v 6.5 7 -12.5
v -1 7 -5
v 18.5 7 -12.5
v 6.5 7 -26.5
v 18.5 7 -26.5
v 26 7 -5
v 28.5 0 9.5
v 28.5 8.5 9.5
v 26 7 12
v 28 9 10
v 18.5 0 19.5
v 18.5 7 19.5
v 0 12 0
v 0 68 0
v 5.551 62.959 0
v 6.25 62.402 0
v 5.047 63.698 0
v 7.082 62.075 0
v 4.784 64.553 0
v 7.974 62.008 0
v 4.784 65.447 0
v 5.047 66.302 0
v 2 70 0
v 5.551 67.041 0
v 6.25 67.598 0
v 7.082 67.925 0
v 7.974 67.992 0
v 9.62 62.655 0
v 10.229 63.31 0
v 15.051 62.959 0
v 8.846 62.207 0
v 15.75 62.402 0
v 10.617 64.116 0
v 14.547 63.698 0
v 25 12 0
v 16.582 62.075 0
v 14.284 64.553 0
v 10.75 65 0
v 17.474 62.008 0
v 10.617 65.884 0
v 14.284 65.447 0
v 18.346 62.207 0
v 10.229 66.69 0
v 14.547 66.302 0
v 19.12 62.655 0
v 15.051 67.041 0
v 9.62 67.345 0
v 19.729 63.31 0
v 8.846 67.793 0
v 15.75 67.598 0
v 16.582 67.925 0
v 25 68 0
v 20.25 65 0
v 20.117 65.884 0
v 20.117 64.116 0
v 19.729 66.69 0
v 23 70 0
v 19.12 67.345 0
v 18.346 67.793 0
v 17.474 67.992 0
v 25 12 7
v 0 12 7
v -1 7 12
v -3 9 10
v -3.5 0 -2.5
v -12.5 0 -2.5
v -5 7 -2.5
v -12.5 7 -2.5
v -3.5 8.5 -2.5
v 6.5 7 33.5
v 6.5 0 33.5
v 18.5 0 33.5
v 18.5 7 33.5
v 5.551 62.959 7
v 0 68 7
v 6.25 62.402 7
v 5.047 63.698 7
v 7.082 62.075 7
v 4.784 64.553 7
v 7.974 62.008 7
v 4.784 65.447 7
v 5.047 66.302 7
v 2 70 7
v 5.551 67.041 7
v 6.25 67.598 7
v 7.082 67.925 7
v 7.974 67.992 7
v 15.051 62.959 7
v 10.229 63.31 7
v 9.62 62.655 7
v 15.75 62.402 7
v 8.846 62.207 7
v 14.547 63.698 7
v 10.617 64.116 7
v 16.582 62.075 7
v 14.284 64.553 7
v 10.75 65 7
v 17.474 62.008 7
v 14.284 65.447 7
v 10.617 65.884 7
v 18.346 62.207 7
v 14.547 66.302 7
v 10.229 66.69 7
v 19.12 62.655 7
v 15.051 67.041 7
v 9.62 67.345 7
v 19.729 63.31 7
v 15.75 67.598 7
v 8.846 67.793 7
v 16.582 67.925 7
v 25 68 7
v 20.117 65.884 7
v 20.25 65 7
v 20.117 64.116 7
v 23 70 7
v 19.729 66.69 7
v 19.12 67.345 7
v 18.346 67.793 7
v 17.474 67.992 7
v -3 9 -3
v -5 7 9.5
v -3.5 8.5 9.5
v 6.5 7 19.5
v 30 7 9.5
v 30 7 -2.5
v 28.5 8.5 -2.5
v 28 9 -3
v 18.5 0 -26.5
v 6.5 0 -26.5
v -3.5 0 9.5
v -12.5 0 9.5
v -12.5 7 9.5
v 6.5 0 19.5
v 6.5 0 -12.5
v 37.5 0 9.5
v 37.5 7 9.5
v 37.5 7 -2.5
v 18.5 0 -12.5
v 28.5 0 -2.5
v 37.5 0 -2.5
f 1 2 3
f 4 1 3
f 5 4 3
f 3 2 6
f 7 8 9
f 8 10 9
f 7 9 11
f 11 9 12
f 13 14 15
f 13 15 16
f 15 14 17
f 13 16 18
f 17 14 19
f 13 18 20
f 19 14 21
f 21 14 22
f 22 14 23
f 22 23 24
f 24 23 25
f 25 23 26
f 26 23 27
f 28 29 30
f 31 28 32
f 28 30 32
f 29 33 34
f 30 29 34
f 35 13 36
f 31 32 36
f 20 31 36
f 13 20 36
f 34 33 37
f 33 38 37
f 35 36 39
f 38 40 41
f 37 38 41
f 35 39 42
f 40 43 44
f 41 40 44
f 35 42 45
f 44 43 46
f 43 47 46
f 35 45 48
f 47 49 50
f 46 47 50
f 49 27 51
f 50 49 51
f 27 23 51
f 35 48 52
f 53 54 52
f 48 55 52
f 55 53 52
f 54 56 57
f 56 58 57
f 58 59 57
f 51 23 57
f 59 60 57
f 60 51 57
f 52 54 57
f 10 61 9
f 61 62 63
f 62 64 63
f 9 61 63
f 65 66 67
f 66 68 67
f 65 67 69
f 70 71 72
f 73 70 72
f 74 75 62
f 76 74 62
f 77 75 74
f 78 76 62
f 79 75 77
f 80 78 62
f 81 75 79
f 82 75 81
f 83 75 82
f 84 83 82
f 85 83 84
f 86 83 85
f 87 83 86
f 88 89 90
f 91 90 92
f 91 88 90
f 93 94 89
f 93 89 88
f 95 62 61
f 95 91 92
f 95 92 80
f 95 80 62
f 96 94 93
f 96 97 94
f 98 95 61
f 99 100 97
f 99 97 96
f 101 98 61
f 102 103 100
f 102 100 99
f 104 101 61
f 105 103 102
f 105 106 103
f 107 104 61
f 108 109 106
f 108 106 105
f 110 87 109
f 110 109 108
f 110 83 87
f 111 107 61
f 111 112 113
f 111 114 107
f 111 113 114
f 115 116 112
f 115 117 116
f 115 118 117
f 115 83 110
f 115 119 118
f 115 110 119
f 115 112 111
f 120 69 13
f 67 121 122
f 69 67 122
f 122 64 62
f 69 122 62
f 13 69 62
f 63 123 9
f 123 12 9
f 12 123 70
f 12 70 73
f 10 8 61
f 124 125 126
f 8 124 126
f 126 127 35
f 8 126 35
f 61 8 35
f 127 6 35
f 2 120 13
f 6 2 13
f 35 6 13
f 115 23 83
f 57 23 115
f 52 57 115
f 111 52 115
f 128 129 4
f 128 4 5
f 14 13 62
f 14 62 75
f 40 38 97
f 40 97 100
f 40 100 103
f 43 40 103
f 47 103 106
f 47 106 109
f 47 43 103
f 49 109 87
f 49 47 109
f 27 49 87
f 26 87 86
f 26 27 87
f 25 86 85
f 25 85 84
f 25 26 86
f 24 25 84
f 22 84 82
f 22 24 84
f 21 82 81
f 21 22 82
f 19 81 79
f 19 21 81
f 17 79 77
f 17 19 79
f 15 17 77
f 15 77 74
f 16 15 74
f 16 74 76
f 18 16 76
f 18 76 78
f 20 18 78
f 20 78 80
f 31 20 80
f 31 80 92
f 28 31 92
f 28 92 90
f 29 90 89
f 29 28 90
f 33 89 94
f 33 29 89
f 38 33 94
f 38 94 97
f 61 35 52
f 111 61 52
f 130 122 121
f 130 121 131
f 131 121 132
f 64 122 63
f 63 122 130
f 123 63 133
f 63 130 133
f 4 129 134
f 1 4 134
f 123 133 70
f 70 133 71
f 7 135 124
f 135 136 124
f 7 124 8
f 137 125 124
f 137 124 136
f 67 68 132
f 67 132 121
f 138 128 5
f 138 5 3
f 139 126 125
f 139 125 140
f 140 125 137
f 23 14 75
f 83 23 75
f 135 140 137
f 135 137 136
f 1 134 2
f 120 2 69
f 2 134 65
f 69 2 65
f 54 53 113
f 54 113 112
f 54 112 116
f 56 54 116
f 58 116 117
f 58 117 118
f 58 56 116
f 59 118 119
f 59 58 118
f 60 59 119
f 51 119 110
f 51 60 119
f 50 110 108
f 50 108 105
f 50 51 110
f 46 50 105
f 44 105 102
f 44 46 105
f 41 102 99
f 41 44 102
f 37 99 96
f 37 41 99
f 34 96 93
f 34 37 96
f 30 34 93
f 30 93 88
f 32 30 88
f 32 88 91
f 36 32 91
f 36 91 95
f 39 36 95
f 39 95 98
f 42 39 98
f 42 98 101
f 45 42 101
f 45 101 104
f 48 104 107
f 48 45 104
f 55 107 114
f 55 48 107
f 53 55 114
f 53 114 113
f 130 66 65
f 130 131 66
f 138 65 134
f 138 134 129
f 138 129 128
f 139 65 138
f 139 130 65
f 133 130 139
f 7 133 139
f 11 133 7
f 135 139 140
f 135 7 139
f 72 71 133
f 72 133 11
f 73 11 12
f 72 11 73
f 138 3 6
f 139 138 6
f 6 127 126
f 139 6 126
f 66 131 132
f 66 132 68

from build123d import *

# Parameters (mm, degrees)
SKETCH1_W           = 25
SKETCH1_H           = 70
SKETCH1_R           = 3
BOSS_EXTRUDE1_DEPTH = 7
SKETCH2_W           = 12
SKETCH2_H           = 24
SKETCH2_H_2         = 7
SKETCH2_W_2         = 6.5
SKETCH2_H_3         = 2.5
BOSS_EXTRUDE2_DEPTH = 7
CHAMFER2_SIZE       = 10
CHAMFER3_SIZE       = 5
CHAMFER4_SIZE       = 5
CHAMFER5_SIZE       = 2


with BuildPart() as part:
    # Sketch1 → Boss-Extrude1 (new body)
    with BuildSketch(Plane.XY):
        with Locations((12.5, 35)):
            Rectangle(SKETCH1_W, SKETCH1_H)
        with Locations((7.75, 65)):
            Circle(SKETCH1_R, mode=Mode.SUBTRACT)
        with Locations((17.25, 65)):
            Circle(SKETCH1_R, mode=Mode.SUBTRACT)
    extrude(amount=BOSS_EXTRUDE1_DEPTH)

    # Sketch2 → Boss-Extrude2 (add)
    with BuildSketch(Plane.XZ):
        with Locations((12.5, 21.5)):
            Rectangle(SKETCH2_W, SKETCH2_H)
        Polygon((6.5, 7), (6.5, 9.5), (-12.5, 9.5), (-12.5, -2.5), (6.5, -2.5), (6.5, 0), (0, 0), (0, 7), align=None)
        with Locations((12.5, 3.5)):
            Rectangle(SKETCH2_W, SKETCH2_H_2)
        Polygon((37.5, 9.5), (18.5, 9.5), (18.5, 7), (25, 7), (25, 0), (18.5, 0), (18.5, -2.5), (37.5, -2.5), align=None)
        with Locations((12.5, -14.5)):
            Rectangle(SKETCH2_W, SKETCH2_H)
        with Locations((3.25, 3.5)):
            Rectangle(SKETCH2_W_2, SKETCH2_H_2)
        with Locations((12.5, 8.25)):
            Rectangle(SKETCH2_W, SKETCH2_H_3)
        with Locations((12.5, -1.25)):
            Rectangle(SKETCH2_W, SKETCH2_H_3)
        with Locations((21.75, 3.5)):
            Rectangle(SKETCH2_W_2, SKETCH2_H_2)
    extrude(amount=-BOSS_EXTRUDE2_DEPTH)

    # Chamfer2
    chamfer2_edges = [part.edges().sort_by_distance(p)[0] for p in [
        (18.5, 3.5, 9.5),
        (18.5, 3.5, -2.5),
        (6.5, 3.5, -2.5),
        (6.5, 3.5, 9.5),
    ]]
    chamfer(chamfer2_edges, length=CHAMFER2_SIZE)

    # Chamfer3
    chamfer3_edges = [part.edges().sort_by_distance(p)[0] for p in [
        (12.5, 7, 7),
        (12.5, 7, 0),
    ]]
    chamfer(chamfer3_edges, length=CHAMFER3_SIZE)

    # Chamfer4
    # the kernel refuses this chamfer: 5 mm, written as the material it adds along each edge
    with BuildSketch(Plane(origin=(25, 7, -17.85841494), x_dir=(0.9996219169112968, -0.027495876610586317, 0), z_dir=(0, 0, 1))) as chamfer4_piece_1_section:
        Polygon((CHAMFER4_SIZE * 0.999621916911, CHAMFER4_SIZE * 0.0274958766106), (-CHAMFER4_SIZE * 0.0274958766106, CHAMFER4_SIZE * 0.999621916911), (0, 0), align=None)
    chamfer4_piece_1 = extrude(amount=42.71682988, mode=Mode.PRIVATE)
    chamfer4_piece_1 = split(chamfer4_piece_1, bisect_by=Plane(origin=(26.380997475, 7.88604798, 9.5), z_dir=(0, 0, -1)), keep=Keep.TOP, mode=Mode.PRIVATE)
    chamfer4_piece_1 = split(chamfer4_piece_1, bisect_by=Plane(origin=(27.086016414, 7.88604798, -3.913983586), z_dir=(-0.7071067811865475, 0, 0.7071067811865477)), keep=Keep.TOP, mode=Mode.PRIVATE)
    chamfer4_piece_1 = split(chamfer4_piece_1, bisect_by=Plane(origin=(26.380997475, 8.338541667, -3.661458333), z_dir=(0, -0.7071067811865476, 0.7071067811865476)), keep=Keep.TOP, mode=Mode.PRIVATE)
    chamfer4_piece_1 = split(chamfer4_piece_1, bisect_by=Plane(origin=(26.380997475, 15.047506313, 3.952493687), z_dir=(0, -0.7071067811865476, -0.7071067811865476)), keep=Keep.TOP, mode=Mode.PRIVATE)
    add(chamfer4_piece_1)
    with BuildSketch(Plane(origin=(25, 7, -17.85841494), x_dir=(0.9996219169112968, -0.027495876610586317, 0), z_dir=(0, 0, 1))) as chamfer4_piece_2_section:
        Polygon((CHAMFER4_SIZE * 0.999621916911, CHAMFER4_SIZE * 0.0274958766106), (-CHAMFER4_SIZE * 0.0274958766106, CHAMFER4_SIZE * 0.999621916911), (0, 0), align=None)
    chamfer4_piece_2 = extrude(amount=42.71682988, mode=Mode.PRIVATE)
    chamfer4_piece_2 = split(chamfer4_piece_2, bisect_by=Plane(origin=(34.6875, 7.375, 3.3125), z_dir=(-0.7071067811865475, 0, -0.7071067811865477)), keep=Keep.TOP, mode=Mode.PRIVATE)
    chamfer4_piece_2 = split(chamfer4_piece_2, bisect_by=Plane(origin=(29.25, 7.375, -2.5), z_dir=(0, 0, 1)), keep=Keep.TOP, mode=Mode.PRIVATE)
    chamfer4_piece_2 = split(chamfer4_piece_2, bisect_by=Plane(origin=(29.25, 8.625, -3.375), z_dir=(0, -0.7071067811865476, 0.7071067811865476)), keep=Keep.TOP, mode=Mode.PRIVATE)
    chamfer4_piece_2 = split(chamfer4_piece_2, bisect_by=Plane(origin=(29.25, 14.25, 4.75), z_dir=(0, -0.7071067811865476, -0.7071067811865476)), keep=Keep.TOP, mode=Mode.PRIVATE)
    add(chamfer4_piece_2)
    with BuildSketch(Plane(origin=(0, 7, 24.85841494), x_dir=(-0.9996219169112968, -0.027495876610586317, 0), z_dir=(0, 0, -1))) as chamfer4_piece_3_section:
        Polygon((CHAMFER4_SIZE * 0.999621916911, CHAMFER4_SIZE * 0.0274958766106), (-CHAMFER4_SIZE * 0.0274958766106, CHAMFER4_SIZE * 0.999621916911), (0, 0), align=None)
    chamfer4_piece_3 = extrude(amount=42.71682988, mode=Mode.PRIVATE)
    chamfer4_piece_3 = split(chamfer4_piece_3, bisect_by=Plane(origin=(-2.086016414, 7.88604798, 10.913983586), z_dir=(0.7071067811865477, 0, -0.7071067811865475)), keep=Keep.TOP, mode=Mode.PRIVATE)
    chamfer4_piece_3 = split(chamfer4_piece_3, bisect_by=Plane(origin=(-1.380997475, 7.88604798, -2.5), z_dir=(0, 0, 1)), keep=Keep.TOP, mode=Mode.PRIVATE)
    chamfer4_piece_3 = split(chamfer4_piece_3, bisect_by=Plane(origin=(-1.380997475, 15.047506313, 3.047506313), z_dir=(0, -0.7071067811865476, 0.7071067811865476)), keep=Keep.TOP, mode=Mode.PRIVATE)
    chamfer4_piece_3 = split(chamfer4_piece_3, bisect_by=Plane(origin=(-1.380997475, 8.338541667, 10.661458333), z_dir=(0, -0.7071067811865476, -0.7071067811865476)), keep=Keep.TOP, mode=Mode.PRIVATE)
    add(chamfer4_piece_3)
    with BuildSketch(Plane(origin=(0, 7, 24.85841494), x_dir=(-0.9996219169112968, -0.027495876610586317, 0), z_dir=(0, 0, -1))) as chamfer4_piece_4_section:
        Polygon((CHAMFER4_SIZE * 0.999621916911, CHAMFER4_SIZE * 0.0274958766106), (-CHAMFER4_SIZE * 0.0274958766106, CHAMFER4_SIZE * 0.999621916911), (0, 0), align=None)
    chamfer4_piece_4 = extrude(amount=42.71682988, mode=Mode.PRIVATE)
    chamfer4_piece_4 = split(chamfer4_piece_4, bisect_by=Plane(origin=(-4.25, 7.375, 9.5), z_dir=(0, 0, -1)), keep=Keep.TOP, mode=Mode.PRIVATE)
    chamfer4_piece_4 = split(chamfer4_piece_4, bisect_by=Plane(origin=(-9.6875, 7.375, 3.6875), z_dir=(0.7071067811865476, 0, 0.7071067811865475)), keep=Keep.TOP, mode=Mode.PRIVATE)
    chamfer4_piece_4 = split(chamfer4_piece_4, bisect_by=Plane(origin=(-4.25, 14.25, 2.25), z_dir=(0, -0.7071067811865476, 0.7071067811865476)), keep=Keep.TOP, mode=Mode.PRIVATE)
    chamfer4_piece_4 = split(chamfer4_piece_4, bisect_by=Plane(origin=(-4.25, 8.625, 10.375), z_dir=(0, -0.7071067811865476, -0.7071067811865476)), keep=Keep.TOP, mode=Mode.PRIVATE)
    add(chamfer4_piece_4)

    # Chamfer5
    chamfer5_edges = [part.edges().sort_by_distance(p)[0] for p in [
        (0, 70, 3.5),
        (25, 70, 3.5),
    ]]
    chamfer(chamfer5_edges, length=CHAMFER5_SIZE)


solid = part.part
